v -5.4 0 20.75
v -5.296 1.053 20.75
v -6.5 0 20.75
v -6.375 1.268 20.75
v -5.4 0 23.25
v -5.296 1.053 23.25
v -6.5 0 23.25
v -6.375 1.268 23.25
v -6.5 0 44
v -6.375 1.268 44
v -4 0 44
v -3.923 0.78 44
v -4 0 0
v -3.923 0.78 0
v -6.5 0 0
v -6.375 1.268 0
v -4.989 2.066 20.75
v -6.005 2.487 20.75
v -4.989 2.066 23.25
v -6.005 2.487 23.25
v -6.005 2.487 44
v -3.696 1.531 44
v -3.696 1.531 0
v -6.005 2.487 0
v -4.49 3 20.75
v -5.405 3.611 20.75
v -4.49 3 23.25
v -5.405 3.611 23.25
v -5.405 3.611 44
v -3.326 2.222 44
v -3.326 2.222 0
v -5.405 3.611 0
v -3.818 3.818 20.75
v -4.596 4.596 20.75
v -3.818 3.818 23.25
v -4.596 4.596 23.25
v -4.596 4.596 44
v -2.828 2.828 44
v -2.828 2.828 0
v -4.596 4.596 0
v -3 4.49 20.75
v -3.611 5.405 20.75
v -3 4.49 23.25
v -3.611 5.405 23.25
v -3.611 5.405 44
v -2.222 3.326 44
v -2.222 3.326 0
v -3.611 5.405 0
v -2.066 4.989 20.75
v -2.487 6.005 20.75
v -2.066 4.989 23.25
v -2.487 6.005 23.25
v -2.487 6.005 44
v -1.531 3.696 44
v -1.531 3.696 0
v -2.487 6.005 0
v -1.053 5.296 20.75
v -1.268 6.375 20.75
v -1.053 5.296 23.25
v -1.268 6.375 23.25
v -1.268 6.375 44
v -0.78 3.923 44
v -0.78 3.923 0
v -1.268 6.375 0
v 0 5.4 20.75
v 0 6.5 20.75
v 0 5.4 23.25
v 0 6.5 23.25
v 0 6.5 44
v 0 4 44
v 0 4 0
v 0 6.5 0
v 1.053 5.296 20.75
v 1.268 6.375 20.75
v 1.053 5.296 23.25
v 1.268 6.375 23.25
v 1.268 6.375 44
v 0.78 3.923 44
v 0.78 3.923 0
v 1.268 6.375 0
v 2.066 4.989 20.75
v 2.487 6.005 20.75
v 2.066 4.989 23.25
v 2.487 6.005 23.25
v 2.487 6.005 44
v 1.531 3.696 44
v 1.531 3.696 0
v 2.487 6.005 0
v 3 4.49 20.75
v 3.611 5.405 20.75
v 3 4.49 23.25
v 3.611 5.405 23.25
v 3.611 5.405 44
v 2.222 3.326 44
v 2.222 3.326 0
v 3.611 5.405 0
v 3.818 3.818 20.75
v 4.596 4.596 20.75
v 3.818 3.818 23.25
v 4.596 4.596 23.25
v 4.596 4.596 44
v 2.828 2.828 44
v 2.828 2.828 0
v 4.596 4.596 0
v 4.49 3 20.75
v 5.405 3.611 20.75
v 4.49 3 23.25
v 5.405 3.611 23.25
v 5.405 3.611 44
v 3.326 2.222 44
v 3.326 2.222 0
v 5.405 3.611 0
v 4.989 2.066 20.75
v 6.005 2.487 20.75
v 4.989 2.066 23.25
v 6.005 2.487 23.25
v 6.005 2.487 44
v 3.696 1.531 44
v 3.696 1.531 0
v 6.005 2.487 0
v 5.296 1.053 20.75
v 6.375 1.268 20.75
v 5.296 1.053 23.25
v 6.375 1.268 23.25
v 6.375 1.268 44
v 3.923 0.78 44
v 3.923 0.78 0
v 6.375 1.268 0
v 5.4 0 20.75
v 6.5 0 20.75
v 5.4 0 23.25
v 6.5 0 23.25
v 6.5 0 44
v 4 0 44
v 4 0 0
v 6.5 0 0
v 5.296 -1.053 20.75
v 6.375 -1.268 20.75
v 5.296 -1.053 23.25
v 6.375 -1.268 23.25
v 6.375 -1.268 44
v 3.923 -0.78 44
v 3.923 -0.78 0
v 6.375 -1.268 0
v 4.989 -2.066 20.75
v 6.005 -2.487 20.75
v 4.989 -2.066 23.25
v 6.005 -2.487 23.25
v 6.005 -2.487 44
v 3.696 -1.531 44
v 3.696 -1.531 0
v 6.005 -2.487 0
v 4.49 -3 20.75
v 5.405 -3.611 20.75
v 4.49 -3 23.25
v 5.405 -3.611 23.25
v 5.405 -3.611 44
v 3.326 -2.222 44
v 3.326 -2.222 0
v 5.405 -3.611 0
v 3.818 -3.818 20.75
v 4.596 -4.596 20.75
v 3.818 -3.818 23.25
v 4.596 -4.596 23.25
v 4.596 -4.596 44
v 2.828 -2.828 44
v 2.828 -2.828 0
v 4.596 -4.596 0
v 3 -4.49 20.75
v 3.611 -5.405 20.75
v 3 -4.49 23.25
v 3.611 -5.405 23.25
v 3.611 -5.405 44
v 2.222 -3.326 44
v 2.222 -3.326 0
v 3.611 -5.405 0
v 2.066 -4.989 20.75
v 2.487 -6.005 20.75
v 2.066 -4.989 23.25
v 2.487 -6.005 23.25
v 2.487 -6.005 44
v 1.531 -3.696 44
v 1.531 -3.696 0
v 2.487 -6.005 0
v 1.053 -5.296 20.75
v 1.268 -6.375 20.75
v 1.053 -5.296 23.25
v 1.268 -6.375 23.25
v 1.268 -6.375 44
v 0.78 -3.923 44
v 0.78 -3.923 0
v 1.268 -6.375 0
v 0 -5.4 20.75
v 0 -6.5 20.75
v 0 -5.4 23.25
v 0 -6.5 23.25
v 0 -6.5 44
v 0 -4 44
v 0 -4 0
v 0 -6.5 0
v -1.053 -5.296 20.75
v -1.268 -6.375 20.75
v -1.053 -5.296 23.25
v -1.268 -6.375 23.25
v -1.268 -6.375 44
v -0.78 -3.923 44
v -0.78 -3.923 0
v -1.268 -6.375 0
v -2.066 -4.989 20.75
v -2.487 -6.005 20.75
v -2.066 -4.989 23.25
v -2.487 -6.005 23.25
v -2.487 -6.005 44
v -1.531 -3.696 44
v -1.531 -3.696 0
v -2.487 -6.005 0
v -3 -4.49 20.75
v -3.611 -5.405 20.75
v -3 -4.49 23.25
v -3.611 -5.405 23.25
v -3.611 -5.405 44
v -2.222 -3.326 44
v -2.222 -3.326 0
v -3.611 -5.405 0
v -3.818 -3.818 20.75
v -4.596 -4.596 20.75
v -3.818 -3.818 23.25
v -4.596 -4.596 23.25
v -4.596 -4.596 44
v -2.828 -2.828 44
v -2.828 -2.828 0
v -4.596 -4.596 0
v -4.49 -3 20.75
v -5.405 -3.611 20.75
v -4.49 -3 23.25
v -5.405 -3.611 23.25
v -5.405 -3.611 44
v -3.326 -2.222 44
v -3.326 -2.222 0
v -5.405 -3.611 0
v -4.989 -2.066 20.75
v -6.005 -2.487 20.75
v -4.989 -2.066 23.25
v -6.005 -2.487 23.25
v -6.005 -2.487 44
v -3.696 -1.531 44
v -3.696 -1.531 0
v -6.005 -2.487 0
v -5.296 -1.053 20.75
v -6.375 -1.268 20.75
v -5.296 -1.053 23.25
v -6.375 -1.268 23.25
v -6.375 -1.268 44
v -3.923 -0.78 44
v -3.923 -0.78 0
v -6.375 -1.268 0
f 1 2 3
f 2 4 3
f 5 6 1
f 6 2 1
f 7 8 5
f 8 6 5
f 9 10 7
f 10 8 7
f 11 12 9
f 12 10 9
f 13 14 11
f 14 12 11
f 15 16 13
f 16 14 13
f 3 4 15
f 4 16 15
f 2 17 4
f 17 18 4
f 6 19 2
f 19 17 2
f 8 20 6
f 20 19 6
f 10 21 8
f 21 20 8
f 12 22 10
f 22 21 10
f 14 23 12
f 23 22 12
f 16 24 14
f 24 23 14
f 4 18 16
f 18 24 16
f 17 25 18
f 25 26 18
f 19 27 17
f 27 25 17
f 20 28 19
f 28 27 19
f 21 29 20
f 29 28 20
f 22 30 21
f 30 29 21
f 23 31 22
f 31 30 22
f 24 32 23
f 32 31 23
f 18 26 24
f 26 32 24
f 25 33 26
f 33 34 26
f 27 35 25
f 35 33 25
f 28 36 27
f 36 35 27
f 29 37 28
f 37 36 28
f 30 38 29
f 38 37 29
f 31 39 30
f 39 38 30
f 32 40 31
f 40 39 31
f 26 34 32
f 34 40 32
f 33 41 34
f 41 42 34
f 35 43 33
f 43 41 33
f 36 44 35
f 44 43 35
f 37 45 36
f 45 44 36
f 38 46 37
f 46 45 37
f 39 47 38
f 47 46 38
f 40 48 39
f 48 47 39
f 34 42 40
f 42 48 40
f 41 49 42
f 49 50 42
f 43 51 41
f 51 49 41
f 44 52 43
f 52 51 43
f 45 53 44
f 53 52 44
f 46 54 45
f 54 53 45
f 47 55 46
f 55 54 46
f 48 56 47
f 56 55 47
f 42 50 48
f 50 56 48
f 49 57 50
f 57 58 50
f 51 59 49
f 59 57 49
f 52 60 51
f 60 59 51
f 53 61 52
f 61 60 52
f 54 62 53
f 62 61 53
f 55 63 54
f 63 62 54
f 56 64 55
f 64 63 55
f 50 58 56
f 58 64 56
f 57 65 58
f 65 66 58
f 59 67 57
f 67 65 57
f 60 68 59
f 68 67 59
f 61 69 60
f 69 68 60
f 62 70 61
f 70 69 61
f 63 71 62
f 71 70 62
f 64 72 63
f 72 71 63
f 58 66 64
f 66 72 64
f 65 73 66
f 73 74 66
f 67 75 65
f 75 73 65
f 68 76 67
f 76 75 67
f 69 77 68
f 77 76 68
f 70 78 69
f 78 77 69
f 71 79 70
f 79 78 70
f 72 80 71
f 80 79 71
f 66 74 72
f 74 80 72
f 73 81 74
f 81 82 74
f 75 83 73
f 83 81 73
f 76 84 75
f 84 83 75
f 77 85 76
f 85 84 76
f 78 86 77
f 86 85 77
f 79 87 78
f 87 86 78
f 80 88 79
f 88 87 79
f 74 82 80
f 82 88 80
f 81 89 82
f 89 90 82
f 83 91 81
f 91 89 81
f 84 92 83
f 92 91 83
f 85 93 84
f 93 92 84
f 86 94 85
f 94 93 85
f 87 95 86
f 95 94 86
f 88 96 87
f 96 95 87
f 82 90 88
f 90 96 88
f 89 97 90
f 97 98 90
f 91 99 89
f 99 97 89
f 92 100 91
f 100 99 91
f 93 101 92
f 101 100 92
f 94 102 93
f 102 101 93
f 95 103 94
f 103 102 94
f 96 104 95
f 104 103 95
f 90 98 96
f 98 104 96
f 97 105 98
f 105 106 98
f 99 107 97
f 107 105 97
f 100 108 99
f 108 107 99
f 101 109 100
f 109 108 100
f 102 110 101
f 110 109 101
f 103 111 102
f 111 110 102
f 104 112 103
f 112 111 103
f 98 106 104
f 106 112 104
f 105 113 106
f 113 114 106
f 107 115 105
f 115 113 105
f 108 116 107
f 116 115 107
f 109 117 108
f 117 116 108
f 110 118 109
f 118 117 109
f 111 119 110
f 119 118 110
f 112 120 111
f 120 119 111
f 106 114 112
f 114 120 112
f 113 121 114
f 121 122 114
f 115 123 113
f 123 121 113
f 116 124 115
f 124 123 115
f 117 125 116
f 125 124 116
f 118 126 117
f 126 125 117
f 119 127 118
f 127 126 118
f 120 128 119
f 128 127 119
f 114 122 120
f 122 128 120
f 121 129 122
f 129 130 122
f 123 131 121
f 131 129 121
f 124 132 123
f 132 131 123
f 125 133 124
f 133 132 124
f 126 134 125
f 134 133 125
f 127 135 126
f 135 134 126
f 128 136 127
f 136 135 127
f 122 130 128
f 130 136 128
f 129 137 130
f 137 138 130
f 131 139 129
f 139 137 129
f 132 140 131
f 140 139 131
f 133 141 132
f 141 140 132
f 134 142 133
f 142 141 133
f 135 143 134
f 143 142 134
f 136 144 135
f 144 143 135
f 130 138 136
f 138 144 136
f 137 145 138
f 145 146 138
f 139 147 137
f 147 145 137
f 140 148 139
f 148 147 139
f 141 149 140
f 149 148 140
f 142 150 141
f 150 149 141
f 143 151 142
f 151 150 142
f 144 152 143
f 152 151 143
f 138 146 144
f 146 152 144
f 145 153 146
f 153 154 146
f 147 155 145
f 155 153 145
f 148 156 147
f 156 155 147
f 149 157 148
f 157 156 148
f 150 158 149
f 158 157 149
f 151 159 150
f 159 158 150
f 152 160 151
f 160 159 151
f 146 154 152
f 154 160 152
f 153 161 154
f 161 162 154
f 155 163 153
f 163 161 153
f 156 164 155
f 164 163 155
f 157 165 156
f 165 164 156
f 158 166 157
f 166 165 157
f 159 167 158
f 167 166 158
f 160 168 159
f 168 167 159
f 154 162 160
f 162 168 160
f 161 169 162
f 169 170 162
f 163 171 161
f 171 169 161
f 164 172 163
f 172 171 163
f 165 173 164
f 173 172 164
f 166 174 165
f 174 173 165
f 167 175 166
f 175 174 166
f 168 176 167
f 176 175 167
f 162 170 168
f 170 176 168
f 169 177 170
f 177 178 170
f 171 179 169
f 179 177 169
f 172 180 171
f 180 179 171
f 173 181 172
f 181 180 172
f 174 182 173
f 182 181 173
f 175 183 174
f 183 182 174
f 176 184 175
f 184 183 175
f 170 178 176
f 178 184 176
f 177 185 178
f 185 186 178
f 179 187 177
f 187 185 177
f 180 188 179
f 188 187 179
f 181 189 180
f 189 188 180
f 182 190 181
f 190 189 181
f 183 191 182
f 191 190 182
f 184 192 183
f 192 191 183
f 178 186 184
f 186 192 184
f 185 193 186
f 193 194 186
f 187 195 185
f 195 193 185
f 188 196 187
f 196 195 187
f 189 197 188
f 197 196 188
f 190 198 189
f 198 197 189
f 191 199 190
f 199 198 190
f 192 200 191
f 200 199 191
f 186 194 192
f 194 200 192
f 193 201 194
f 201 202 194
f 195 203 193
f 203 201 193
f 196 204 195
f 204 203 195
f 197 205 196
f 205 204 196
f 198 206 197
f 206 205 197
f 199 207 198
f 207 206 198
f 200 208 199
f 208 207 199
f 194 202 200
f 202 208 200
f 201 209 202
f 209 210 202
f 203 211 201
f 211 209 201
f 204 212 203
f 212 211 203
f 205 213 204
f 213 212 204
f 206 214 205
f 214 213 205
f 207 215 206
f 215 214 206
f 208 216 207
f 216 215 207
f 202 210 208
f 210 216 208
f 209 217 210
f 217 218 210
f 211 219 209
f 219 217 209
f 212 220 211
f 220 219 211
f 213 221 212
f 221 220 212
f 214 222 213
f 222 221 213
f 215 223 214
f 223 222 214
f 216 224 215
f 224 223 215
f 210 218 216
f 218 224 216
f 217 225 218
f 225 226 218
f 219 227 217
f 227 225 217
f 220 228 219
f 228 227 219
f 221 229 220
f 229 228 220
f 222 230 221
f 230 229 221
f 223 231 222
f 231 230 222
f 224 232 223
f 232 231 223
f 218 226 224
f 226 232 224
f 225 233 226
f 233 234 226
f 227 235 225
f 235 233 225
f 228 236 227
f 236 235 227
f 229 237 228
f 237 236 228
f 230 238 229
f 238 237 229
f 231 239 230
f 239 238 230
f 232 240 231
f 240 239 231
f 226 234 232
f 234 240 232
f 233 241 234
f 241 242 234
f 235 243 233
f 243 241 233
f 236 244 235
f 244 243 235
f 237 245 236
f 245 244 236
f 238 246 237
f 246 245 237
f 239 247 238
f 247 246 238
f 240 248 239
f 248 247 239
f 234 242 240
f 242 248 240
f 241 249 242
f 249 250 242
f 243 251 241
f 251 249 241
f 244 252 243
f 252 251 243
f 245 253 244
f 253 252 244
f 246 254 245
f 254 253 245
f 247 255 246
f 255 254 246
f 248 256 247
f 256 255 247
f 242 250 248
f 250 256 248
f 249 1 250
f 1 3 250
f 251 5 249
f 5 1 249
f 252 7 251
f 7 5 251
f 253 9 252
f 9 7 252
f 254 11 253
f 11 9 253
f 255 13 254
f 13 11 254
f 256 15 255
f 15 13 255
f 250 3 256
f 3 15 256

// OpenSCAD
$fn = 32;

// ----------------------------------------------------------------------
// Grooved revolve: plain_grooves, bore R4
// ----------------------------------------------------------------------

// --- parameters (mm) ---
bore_r = 4;               // bore radius
outer_r = 6.5;            // outer radius of the body
total_h = 44;             // overall height, Z
wall = 2.5;               // radial wall thickness
groove_w = 2.5;           // groove width
groove_d = 1.1;           // groove depth
grooves = 1;              // number of outer grooves
fit_tol = 0.1;            // declared fit tolerance (prompt contract)
free_tol = 0.5;           // declared free tolerance (prompt contract)

bbox_x = 2 * outer_r;  // full diameter
bore_d = 2 * bore_r;  // bore diameter
body_d = 2 * outer_r;  // body diameter
revolve_angle = 360;  // full turn around the Z axis

profile = [[4, 0], [6.5, 0], [6.5, 20.75], [5.4, 20.75], [5.4, 23.25], [6.5, 23.25], [6.5, 44], [4, 44]];  // primary outline, 8 points, counter clockwise

// --- the one profile operation ---
rotate_extrude(angle = revolve_angle) polygon(points = profile);
